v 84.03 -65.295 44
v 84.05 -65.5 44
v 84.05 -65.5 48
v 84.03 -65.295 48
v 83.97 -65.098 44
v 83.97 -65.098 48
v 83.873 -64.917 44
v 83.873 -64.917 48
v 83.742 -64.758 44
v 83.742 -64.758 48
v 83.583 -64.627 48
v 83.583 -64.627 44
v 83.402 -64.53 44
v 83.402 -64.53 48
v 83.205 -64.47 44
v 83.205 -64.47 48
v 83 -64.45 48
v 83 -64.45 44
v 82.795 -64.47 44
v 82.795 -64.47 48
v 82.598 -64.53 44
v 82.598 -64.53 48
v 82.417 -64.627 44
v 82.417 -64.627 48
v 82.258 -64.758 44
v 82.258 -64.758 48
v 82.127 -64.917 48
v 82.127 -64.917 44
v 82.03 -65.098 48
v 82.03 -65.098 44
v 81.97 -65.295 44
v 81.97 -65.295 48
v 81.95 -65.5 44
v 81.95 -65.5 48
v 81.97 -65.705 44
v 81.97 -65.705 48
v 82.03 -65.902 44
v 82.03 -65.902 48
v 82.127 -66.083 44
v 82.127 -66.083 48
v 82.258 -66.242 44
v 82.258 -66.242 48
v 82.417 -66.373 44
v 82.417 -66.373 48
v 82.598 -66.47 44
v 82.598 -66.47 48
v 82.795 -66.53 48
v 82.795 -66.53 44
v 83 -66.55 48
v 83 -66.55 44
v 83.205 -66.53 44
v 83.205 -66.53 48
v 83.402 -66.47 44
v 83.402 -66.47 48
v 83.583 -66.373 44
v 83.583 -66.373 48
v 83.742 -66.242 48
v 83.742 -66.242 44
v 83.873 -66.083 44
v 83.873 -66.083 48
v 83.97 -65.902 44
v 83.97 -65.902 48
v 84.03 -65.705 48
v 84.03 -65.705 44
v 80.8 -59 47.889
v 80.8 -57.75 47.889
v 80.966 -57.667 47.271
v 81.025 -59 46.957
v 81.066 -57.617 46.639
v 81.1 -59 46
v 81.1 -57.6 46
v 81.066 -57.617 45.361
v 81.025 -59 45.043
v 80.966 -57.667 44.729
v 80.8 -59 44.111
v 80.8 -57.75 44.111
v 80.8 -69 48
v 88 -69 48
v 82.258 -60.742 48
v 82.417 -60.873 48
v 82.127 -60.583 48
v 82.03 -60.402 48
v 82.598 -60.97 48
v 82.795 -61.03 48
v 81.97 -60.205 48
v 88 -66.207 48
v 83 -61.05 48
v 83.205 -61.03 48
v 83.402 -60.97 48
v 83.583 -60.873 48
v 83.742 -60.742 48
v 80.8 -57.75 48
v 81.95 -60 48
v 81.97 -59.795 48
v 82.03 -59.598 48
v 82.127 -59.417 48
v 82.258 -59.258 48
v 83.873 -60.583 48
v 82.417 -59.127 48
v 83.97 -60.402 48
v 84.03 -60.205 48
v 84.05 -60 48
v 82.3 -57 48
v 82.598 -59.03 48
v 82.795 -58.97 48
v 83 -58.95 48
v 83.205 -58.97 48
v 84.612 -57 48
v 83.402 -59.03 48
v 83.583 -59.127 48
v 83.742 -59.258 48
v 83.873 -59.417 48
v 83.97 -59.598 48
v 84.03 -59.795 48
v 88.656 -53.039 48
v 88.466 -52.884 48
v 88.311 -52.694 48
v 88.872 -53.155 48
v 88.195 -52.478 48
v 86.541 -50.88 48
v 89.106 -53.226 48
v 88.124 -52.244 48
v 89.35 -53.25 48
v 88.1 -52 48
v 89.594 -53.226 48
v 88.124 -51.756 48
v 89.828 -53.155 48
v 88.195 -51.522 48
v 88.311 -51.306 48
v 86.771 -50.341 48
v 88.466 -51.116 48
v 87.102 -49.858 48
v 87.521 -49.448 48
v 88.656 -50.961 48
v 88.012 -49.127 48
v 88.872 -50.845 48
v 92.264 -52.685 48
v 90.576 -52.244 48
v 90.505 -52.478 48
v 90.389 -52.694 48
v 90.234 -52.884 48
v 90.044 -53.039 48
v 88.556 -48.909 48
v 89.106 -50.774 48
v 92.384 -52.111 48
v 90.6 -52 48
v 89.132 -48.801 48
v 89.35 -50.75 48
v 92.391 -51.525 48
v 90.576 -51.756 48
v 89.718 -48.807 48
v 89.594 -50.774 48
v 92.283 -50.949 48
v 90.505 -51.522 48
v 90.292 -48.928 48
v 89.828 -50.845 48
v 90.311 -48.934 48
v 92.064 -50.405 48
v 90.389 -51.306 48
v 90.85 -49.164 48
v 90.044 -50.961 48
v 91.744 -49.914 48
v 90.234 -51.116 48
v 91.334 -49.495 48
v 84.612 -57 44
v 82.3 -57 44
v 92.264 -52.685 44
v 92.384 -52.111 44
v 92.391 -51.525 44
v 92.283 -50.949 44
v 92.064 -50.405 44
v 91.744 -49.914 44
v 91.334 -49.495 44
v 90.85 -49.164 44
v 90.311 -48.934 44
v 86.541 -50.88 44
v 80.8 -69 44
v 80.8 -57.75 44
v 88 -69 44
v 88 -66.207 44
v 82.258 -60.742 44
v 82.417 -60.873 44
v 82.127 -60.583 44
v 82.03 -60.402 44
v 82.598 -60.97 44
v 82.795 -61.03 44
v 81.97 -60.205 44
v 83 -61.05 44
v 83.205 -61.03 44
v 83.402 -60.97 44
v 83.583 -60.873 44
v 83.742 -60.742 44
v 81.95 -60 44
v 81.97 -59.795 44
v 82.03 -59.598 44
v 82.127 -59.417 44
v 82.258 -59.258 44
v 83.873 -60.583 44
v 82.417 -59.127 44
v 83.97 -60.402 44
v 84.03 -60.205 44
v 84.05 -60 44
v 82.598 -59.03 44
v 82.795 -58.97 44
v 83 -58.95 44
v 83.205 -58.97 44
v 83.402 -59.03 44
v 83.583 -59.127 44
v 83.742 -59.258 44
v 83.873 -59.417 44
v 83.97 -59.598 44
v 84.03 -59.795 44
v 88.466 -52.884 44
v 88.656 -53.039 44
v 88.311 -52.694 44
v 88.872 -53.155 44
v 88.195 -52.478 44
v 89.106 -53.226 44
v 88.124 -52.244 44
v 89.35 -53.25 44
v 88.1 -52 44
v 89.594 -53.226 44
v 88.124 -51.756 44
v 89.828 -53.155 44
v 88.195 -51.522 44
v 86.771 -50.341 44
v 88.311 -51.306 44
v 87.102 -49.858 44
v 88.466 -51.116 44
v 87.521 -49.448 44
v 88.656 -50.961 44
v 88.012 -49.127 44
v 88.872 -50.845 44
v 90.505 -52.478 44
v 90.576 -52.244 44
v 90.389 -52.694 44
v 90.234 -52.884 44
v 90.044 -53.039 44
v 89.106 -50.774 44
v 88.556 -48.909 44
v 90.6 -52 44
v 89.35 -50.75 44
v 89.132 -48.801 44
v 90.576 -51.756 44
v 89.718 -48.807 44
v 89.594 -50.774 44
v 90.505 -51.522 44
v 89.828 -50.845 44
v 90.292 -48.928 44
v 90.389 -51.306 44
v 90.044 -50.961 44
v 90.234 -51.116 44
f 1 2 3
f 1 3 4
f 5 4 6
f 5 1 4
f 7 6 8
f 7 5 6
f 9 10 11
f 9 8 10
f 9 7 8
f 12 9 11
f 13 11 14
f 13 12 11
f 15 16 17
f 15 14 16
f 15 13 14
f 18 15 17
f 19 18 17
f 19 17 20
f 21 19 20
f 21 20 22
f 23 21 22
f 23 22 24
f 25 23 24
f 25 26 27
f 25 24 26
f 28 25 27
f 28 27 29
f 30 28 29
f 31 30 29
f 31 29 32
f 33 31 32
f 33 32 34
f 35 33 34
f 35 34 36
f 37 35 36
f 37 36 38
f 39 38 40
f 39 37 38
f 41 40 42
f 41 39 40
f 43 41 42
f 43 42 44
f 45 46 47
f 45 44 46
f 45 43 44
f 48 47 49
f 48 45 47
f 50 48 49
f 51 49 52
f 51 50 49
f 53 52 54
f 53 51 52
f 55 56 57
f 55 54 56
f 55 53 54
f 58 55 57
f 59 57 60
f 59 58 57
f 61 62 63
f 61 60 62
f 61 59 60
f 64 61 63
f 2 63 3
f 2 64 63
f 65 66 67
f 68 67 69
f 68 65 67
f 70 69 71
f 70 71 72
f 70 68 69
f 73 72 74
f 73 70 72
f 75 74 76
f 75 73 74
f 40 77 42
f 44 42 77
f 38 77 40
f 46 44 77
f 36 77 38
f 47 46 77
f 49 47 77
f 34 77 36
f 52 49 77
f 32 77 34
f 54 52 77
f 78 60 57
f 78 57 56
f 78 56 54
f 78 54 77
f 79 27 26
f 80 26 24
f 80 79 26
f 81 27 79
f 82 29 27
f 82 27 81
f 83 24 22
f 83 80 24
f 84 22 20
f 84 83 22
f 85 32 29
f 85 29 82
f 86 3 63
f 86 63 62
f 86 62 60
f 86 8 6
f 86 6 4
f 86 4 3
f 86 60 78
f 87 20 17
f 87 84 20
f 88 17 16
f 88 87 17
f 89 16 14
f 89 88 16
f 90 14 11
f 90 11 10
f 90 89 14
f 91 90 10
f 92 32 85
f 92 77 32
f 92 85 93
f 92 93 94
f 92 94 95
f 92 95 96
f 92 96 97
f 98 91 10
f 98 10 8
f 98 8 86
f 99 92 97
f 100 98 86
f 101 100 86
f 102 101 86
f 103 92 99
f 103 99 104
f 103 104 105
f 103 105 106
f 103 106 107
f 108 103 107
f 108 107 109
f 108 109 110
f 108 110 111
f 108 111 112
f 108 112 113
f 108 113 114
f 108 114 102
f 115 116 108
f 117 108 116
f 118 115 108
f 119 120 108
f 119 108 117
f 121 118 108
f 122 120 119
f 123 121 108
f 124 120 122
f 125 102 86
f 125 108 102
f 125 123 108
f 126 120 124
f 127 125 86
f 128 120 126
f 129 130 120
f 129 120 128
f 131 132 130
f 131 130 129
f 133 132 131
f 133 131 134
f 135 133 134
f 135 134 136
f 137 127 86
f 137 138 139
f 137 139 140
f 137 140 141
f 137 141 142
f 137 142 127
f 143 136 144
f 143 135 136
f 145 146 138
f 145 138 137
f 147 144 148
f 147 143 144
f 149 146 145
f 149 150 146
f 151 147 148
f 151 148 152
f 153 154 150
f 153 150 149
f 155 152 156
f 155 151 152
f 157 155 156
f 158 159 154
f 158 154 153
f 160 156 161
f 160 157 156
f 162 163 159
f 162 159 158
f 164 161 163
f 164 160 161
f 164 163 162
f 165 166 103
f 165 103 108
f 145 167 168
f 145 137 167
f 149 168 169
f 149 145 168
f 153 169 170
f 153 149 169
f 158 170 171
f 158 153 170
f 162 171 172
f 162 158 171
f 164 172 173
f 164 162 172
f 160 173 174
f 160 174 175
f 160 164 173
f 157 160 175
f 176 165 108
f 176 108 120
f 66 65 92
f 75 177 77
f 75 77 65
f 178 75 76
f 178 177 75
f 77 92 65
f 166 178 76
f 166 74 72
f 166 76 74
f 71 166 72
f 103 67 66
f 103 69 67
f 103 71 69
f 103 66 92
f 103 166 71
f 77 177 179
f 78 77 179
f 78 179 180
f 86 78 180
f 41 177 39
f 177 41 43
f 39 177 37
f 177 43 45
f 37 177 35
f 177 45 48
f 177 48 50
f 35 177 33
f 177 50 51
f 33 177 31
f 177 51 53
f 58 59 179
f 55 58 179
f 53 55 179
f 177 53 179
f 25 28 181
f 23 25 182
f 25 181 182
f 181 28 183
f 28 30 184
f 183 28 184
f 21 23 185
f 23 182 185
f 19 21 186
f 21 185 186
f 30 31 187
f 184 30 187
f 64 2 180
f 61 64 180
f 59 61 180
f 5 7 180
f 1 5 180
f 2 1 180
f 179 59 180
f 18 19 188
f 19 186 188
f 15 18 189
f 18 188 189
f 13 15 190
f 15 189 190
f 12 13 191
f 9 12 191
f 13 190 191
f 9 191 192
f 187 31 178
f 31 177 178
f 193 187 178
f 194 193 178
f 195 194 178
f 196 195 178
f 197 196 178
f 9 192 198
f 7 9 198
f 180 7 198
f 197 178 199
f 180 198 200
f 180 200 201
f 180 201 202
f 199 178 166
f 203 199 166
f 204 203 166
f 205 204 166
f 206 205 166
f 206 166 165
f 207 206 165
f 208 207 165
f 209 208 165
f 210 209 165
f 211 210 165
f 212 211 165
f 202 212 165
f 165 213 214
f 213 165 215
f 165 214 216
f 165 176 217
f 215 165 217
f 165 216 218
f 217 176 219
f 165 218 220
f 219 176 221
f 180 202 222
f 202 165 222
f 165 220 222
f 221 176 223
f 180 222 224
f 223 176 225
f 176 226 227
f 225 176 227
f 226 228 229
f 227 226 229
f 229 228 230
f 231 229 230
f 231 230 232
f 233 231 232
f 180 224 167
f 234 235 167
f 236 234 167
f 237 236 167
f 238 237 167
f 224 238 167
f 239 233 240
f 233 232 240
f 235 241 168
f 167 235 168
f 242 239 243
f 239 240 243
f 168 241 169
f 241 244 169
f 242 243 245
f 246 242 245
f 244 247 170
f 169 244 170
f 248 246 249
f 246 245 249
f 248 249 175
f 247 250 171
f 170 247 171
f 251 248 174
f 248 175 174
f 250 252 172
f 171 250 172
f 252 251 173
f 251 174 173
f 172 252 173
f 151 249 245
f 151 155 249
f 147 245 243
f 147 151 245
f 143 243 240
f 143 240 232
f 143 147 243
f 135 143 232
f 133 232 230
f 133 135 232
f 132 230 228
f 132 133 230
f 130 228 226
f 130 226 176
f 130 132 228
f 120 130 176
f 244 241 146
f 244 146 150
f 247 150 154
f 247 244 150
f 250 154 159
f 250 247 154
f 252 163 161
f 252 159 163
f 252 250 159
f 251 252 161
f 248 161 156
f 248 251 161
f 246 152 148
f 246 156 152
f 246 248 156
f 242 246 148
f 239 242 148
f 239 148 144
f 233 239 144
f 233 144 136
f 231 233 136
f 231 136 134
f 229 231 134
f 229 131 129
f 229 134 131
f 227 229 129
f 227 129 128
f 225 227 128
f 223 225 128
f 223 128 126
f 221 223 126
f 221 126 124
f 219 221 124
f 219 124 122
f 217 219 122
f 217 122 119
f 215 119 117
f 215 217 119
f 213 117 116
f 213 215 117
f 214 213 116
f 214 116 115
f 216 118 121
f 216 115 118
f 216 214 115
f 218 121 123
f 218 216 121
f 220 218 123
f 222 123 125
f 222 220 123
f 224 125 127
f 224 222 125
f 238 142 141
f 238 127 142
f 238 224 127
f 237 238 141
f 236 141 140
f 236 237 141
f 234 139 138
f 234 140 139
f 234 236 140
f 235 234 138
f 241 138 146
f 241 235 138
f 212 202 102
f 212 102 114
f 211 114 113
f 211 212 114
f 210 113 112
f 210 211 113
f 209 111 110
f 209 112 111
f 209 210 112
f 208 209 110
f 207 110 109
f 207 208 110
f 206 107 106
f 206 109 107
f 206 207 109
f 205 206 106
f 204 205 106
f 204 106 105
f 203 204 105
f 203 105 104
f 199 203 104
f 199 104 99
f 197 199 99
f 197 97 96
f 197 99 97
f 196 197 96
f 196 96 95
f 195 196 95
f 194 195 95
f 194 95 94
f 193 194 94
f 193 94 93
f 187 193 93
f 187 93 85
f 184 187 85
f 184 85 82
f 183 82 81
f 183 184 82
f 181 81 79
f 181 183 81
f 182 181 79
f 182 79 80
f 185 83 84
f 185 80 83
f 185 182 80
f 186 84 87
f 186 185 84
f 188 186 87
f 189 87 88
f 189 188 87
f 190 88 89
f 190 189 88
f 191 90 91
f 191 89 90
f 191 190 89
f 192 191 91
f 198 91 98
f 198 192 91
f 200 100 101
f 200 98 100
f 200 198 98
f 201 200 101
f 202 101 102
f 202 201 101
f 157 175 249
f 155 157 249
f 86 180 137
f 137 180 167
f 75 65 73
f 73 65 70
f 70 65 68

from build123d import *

# Parameters (mm, degrees)
CYLINDER749_R          = 1.25
CYLINDER749_DEPTH      = 6
CYLINDER792_R          = 6.1
CYLINDER792_DEPTH      = 8
CYLINDER789_R          = 1.05
CYLINDER789_DEPTH      = 37
CYLINDER790_R          = 1.05
CYLINDER790_DEPTH      = 37
CYLINDER791_R          = 1.05
CYLINDER791_DEPTH      = 37
CYLINDER788_R          = 1.05
CYLINDER788_DEPTH      = 37
BOX289_W               = 7.2
BOX289_H               = 12
BOX289_DEPTH           = 4
BOX284_W               = 18
BOX284_H               = 6
BOX284_DEPTH           = 4
BOX284_PLACEMENT_ANGLE = 72.5
FILLET125007020021_R   = 2.99
CHAMFER228022_SIZE2    = 1.5
CHAMFER228022_SIZE     = 0.75


with BuildPart() as cylinder749:
    # Cylinder749 → Cylinder749 (new body)
    with BuildSketch(Plane(origin=(14.35, 41, -3), x_dir=(1, 0, 0), z_dir=(0, 0, 1))):
        Circle(CYLINDER749_R)
    extrude(amount=CYLINDER749_DEPTH)


with BuildPart() as cylinder792:
    # Cylinder792 → Cylinder792 (new body)
    with BuildSketch(Plane(origin=(0, 34, 0), x_dir=(1, 0, 0), z_dir=(0, 1, 0))):
        Circle(CYLINDER792_R)
    extrude(amount=CYLINDER792_DEPTH)


with BuildPart() as cylinder789:
    # Cylinder789 → Cylinder789 (new body)
    with BuildSketch(Plane(origin=(8, 33, -19), x_dir=(1, 0, 0), z_dir=(0, 0, 1))):
        Circle(CYLINDER789_R)
    extrude(amount=CYLINDER789_DEPTH)


with BuildPart() as cylinder790:
    # Cylinder790 → Cylinder790 (new body)
    with BuildSketch(Plane(origin=(-8, 33, -19), x_dir=(1, 0, 0), z_dir=(0, 0, 1))):
        Circle(CYLINDER790_R)
    extrude(amount=CYLINDER790_DEPTH)


with BuildPart() as cylinder791:
    # Cylinder791 → Cylinder791 (new body)
    with BuildSketch(Plane(origin=(8, 27.5, -19), x_dir=(1, 0, 0), z_dir=(0, 0, 1))):
        Circle(CYLINDER791_R)
    extrude(amount=CYLINDER791_DEPTH)


with BuildPart() as fusion088026007031024007008004081011:
    # Cylinder788 → Cylinder788 (new body)
    with BuildSketch(Plane(origin=(-8, 27.5, -19), x_dir=(1, 0, 0), z_dir=(0, 0, 1))):
        Circle(CYLINDER788_R)
    extrude(amount=CYLINDER788_DEPTH)

    # Fusion088026007031024007008004081011: union Cylinder789, Cylinder790, Cylinder791
    add(cylinder789.part)
    add(cylinder790.part)
    add(cylinder791.part)


with BuildPart() as cube288:
    # Box289 → Box289 (new body)
    with BuildSketch(Plane(origin=(5.8, 24, -2), x_dir=(1, 0, 0), z_dir=(0, 0, 1))):
        with Locations((3.6, 6)):
            Rectangle(BOX289_W, BOX289_H)
    extrude(amount=BOX289_DEPTH)


with BuildPart() as cut176013009033007019019008010045:
    # Box284 → Box284 (new body)
    with BuildSketch(Plane.XY):
        with Locations((9, 3)):
            Rectangle(BOX284_W, BOX284_H)
    extrude(amount=BOX284_DEPTH)


with BuildPart() as cut176013009033007019019008010045_1:
    # Box284 placement: moved
    add(cut176013009033007019019008010045.part.moved(Location((12.75, 26, -2))).rotate(Axis((12.75, 26, -2), (0, 0, 1)), BOX284_PLACEMENT_ANGLE))

    # Fillet125007020021
    fillet125007020021_edges = [cut176013009033007019019008010045_1.edges().sort_by_distance(p)[0] for p in [
        (18.162704, 43.166905, 0),
        (12.440403, 44.97114, 0),
    ]]
    fillet(fillet125007020021_edges, radius=FILLET125007020021_R)

    # Fusion088026007031024007008004081010: union Cube288
    add(cube288.part)

    # Cut176013009033007019019008010043: cut Fusion088026007031024007008004081011
    add(fusion088026007031024007008004081011.part, mode=Mode.SUBTRACT)

    # Chamfer228022
    chamfer228022_edges = [cut176013009033007019019008010045_1.edges().sort_by_distance(p)[0] for p in [
        (5.8, 36, 0),
    ]]
    chamfer228022_side = cut176013009033007019019008010045_1.faces().sort_by_distance((5.8, 30, 0))[0]
    chamfer(chamfer228022_edges, length=CHAMFER228022_SIZE, length2=CHAMFER228022_SIZE2, reference=chamfer228022_side)

    # Cut176013009033007019019008010044: cut Cylinder792
    add(cylinder792.part, mode=Mode.SUBTRACT)

    # Cut176013009033007019019008010045: cut Cylinder749
    add(cylinder749.part, mode=Mode.SUBTRACT)


with BuildPart() as cut176013009033007019019008010045_2:
    # Cut176013009033007019019008010045 placement: moved
    add(cut176013009033007019019008010045_1.part.moved(Location((75, -93, 46))))


solid = cut176013009033007019019008010045_2.part
